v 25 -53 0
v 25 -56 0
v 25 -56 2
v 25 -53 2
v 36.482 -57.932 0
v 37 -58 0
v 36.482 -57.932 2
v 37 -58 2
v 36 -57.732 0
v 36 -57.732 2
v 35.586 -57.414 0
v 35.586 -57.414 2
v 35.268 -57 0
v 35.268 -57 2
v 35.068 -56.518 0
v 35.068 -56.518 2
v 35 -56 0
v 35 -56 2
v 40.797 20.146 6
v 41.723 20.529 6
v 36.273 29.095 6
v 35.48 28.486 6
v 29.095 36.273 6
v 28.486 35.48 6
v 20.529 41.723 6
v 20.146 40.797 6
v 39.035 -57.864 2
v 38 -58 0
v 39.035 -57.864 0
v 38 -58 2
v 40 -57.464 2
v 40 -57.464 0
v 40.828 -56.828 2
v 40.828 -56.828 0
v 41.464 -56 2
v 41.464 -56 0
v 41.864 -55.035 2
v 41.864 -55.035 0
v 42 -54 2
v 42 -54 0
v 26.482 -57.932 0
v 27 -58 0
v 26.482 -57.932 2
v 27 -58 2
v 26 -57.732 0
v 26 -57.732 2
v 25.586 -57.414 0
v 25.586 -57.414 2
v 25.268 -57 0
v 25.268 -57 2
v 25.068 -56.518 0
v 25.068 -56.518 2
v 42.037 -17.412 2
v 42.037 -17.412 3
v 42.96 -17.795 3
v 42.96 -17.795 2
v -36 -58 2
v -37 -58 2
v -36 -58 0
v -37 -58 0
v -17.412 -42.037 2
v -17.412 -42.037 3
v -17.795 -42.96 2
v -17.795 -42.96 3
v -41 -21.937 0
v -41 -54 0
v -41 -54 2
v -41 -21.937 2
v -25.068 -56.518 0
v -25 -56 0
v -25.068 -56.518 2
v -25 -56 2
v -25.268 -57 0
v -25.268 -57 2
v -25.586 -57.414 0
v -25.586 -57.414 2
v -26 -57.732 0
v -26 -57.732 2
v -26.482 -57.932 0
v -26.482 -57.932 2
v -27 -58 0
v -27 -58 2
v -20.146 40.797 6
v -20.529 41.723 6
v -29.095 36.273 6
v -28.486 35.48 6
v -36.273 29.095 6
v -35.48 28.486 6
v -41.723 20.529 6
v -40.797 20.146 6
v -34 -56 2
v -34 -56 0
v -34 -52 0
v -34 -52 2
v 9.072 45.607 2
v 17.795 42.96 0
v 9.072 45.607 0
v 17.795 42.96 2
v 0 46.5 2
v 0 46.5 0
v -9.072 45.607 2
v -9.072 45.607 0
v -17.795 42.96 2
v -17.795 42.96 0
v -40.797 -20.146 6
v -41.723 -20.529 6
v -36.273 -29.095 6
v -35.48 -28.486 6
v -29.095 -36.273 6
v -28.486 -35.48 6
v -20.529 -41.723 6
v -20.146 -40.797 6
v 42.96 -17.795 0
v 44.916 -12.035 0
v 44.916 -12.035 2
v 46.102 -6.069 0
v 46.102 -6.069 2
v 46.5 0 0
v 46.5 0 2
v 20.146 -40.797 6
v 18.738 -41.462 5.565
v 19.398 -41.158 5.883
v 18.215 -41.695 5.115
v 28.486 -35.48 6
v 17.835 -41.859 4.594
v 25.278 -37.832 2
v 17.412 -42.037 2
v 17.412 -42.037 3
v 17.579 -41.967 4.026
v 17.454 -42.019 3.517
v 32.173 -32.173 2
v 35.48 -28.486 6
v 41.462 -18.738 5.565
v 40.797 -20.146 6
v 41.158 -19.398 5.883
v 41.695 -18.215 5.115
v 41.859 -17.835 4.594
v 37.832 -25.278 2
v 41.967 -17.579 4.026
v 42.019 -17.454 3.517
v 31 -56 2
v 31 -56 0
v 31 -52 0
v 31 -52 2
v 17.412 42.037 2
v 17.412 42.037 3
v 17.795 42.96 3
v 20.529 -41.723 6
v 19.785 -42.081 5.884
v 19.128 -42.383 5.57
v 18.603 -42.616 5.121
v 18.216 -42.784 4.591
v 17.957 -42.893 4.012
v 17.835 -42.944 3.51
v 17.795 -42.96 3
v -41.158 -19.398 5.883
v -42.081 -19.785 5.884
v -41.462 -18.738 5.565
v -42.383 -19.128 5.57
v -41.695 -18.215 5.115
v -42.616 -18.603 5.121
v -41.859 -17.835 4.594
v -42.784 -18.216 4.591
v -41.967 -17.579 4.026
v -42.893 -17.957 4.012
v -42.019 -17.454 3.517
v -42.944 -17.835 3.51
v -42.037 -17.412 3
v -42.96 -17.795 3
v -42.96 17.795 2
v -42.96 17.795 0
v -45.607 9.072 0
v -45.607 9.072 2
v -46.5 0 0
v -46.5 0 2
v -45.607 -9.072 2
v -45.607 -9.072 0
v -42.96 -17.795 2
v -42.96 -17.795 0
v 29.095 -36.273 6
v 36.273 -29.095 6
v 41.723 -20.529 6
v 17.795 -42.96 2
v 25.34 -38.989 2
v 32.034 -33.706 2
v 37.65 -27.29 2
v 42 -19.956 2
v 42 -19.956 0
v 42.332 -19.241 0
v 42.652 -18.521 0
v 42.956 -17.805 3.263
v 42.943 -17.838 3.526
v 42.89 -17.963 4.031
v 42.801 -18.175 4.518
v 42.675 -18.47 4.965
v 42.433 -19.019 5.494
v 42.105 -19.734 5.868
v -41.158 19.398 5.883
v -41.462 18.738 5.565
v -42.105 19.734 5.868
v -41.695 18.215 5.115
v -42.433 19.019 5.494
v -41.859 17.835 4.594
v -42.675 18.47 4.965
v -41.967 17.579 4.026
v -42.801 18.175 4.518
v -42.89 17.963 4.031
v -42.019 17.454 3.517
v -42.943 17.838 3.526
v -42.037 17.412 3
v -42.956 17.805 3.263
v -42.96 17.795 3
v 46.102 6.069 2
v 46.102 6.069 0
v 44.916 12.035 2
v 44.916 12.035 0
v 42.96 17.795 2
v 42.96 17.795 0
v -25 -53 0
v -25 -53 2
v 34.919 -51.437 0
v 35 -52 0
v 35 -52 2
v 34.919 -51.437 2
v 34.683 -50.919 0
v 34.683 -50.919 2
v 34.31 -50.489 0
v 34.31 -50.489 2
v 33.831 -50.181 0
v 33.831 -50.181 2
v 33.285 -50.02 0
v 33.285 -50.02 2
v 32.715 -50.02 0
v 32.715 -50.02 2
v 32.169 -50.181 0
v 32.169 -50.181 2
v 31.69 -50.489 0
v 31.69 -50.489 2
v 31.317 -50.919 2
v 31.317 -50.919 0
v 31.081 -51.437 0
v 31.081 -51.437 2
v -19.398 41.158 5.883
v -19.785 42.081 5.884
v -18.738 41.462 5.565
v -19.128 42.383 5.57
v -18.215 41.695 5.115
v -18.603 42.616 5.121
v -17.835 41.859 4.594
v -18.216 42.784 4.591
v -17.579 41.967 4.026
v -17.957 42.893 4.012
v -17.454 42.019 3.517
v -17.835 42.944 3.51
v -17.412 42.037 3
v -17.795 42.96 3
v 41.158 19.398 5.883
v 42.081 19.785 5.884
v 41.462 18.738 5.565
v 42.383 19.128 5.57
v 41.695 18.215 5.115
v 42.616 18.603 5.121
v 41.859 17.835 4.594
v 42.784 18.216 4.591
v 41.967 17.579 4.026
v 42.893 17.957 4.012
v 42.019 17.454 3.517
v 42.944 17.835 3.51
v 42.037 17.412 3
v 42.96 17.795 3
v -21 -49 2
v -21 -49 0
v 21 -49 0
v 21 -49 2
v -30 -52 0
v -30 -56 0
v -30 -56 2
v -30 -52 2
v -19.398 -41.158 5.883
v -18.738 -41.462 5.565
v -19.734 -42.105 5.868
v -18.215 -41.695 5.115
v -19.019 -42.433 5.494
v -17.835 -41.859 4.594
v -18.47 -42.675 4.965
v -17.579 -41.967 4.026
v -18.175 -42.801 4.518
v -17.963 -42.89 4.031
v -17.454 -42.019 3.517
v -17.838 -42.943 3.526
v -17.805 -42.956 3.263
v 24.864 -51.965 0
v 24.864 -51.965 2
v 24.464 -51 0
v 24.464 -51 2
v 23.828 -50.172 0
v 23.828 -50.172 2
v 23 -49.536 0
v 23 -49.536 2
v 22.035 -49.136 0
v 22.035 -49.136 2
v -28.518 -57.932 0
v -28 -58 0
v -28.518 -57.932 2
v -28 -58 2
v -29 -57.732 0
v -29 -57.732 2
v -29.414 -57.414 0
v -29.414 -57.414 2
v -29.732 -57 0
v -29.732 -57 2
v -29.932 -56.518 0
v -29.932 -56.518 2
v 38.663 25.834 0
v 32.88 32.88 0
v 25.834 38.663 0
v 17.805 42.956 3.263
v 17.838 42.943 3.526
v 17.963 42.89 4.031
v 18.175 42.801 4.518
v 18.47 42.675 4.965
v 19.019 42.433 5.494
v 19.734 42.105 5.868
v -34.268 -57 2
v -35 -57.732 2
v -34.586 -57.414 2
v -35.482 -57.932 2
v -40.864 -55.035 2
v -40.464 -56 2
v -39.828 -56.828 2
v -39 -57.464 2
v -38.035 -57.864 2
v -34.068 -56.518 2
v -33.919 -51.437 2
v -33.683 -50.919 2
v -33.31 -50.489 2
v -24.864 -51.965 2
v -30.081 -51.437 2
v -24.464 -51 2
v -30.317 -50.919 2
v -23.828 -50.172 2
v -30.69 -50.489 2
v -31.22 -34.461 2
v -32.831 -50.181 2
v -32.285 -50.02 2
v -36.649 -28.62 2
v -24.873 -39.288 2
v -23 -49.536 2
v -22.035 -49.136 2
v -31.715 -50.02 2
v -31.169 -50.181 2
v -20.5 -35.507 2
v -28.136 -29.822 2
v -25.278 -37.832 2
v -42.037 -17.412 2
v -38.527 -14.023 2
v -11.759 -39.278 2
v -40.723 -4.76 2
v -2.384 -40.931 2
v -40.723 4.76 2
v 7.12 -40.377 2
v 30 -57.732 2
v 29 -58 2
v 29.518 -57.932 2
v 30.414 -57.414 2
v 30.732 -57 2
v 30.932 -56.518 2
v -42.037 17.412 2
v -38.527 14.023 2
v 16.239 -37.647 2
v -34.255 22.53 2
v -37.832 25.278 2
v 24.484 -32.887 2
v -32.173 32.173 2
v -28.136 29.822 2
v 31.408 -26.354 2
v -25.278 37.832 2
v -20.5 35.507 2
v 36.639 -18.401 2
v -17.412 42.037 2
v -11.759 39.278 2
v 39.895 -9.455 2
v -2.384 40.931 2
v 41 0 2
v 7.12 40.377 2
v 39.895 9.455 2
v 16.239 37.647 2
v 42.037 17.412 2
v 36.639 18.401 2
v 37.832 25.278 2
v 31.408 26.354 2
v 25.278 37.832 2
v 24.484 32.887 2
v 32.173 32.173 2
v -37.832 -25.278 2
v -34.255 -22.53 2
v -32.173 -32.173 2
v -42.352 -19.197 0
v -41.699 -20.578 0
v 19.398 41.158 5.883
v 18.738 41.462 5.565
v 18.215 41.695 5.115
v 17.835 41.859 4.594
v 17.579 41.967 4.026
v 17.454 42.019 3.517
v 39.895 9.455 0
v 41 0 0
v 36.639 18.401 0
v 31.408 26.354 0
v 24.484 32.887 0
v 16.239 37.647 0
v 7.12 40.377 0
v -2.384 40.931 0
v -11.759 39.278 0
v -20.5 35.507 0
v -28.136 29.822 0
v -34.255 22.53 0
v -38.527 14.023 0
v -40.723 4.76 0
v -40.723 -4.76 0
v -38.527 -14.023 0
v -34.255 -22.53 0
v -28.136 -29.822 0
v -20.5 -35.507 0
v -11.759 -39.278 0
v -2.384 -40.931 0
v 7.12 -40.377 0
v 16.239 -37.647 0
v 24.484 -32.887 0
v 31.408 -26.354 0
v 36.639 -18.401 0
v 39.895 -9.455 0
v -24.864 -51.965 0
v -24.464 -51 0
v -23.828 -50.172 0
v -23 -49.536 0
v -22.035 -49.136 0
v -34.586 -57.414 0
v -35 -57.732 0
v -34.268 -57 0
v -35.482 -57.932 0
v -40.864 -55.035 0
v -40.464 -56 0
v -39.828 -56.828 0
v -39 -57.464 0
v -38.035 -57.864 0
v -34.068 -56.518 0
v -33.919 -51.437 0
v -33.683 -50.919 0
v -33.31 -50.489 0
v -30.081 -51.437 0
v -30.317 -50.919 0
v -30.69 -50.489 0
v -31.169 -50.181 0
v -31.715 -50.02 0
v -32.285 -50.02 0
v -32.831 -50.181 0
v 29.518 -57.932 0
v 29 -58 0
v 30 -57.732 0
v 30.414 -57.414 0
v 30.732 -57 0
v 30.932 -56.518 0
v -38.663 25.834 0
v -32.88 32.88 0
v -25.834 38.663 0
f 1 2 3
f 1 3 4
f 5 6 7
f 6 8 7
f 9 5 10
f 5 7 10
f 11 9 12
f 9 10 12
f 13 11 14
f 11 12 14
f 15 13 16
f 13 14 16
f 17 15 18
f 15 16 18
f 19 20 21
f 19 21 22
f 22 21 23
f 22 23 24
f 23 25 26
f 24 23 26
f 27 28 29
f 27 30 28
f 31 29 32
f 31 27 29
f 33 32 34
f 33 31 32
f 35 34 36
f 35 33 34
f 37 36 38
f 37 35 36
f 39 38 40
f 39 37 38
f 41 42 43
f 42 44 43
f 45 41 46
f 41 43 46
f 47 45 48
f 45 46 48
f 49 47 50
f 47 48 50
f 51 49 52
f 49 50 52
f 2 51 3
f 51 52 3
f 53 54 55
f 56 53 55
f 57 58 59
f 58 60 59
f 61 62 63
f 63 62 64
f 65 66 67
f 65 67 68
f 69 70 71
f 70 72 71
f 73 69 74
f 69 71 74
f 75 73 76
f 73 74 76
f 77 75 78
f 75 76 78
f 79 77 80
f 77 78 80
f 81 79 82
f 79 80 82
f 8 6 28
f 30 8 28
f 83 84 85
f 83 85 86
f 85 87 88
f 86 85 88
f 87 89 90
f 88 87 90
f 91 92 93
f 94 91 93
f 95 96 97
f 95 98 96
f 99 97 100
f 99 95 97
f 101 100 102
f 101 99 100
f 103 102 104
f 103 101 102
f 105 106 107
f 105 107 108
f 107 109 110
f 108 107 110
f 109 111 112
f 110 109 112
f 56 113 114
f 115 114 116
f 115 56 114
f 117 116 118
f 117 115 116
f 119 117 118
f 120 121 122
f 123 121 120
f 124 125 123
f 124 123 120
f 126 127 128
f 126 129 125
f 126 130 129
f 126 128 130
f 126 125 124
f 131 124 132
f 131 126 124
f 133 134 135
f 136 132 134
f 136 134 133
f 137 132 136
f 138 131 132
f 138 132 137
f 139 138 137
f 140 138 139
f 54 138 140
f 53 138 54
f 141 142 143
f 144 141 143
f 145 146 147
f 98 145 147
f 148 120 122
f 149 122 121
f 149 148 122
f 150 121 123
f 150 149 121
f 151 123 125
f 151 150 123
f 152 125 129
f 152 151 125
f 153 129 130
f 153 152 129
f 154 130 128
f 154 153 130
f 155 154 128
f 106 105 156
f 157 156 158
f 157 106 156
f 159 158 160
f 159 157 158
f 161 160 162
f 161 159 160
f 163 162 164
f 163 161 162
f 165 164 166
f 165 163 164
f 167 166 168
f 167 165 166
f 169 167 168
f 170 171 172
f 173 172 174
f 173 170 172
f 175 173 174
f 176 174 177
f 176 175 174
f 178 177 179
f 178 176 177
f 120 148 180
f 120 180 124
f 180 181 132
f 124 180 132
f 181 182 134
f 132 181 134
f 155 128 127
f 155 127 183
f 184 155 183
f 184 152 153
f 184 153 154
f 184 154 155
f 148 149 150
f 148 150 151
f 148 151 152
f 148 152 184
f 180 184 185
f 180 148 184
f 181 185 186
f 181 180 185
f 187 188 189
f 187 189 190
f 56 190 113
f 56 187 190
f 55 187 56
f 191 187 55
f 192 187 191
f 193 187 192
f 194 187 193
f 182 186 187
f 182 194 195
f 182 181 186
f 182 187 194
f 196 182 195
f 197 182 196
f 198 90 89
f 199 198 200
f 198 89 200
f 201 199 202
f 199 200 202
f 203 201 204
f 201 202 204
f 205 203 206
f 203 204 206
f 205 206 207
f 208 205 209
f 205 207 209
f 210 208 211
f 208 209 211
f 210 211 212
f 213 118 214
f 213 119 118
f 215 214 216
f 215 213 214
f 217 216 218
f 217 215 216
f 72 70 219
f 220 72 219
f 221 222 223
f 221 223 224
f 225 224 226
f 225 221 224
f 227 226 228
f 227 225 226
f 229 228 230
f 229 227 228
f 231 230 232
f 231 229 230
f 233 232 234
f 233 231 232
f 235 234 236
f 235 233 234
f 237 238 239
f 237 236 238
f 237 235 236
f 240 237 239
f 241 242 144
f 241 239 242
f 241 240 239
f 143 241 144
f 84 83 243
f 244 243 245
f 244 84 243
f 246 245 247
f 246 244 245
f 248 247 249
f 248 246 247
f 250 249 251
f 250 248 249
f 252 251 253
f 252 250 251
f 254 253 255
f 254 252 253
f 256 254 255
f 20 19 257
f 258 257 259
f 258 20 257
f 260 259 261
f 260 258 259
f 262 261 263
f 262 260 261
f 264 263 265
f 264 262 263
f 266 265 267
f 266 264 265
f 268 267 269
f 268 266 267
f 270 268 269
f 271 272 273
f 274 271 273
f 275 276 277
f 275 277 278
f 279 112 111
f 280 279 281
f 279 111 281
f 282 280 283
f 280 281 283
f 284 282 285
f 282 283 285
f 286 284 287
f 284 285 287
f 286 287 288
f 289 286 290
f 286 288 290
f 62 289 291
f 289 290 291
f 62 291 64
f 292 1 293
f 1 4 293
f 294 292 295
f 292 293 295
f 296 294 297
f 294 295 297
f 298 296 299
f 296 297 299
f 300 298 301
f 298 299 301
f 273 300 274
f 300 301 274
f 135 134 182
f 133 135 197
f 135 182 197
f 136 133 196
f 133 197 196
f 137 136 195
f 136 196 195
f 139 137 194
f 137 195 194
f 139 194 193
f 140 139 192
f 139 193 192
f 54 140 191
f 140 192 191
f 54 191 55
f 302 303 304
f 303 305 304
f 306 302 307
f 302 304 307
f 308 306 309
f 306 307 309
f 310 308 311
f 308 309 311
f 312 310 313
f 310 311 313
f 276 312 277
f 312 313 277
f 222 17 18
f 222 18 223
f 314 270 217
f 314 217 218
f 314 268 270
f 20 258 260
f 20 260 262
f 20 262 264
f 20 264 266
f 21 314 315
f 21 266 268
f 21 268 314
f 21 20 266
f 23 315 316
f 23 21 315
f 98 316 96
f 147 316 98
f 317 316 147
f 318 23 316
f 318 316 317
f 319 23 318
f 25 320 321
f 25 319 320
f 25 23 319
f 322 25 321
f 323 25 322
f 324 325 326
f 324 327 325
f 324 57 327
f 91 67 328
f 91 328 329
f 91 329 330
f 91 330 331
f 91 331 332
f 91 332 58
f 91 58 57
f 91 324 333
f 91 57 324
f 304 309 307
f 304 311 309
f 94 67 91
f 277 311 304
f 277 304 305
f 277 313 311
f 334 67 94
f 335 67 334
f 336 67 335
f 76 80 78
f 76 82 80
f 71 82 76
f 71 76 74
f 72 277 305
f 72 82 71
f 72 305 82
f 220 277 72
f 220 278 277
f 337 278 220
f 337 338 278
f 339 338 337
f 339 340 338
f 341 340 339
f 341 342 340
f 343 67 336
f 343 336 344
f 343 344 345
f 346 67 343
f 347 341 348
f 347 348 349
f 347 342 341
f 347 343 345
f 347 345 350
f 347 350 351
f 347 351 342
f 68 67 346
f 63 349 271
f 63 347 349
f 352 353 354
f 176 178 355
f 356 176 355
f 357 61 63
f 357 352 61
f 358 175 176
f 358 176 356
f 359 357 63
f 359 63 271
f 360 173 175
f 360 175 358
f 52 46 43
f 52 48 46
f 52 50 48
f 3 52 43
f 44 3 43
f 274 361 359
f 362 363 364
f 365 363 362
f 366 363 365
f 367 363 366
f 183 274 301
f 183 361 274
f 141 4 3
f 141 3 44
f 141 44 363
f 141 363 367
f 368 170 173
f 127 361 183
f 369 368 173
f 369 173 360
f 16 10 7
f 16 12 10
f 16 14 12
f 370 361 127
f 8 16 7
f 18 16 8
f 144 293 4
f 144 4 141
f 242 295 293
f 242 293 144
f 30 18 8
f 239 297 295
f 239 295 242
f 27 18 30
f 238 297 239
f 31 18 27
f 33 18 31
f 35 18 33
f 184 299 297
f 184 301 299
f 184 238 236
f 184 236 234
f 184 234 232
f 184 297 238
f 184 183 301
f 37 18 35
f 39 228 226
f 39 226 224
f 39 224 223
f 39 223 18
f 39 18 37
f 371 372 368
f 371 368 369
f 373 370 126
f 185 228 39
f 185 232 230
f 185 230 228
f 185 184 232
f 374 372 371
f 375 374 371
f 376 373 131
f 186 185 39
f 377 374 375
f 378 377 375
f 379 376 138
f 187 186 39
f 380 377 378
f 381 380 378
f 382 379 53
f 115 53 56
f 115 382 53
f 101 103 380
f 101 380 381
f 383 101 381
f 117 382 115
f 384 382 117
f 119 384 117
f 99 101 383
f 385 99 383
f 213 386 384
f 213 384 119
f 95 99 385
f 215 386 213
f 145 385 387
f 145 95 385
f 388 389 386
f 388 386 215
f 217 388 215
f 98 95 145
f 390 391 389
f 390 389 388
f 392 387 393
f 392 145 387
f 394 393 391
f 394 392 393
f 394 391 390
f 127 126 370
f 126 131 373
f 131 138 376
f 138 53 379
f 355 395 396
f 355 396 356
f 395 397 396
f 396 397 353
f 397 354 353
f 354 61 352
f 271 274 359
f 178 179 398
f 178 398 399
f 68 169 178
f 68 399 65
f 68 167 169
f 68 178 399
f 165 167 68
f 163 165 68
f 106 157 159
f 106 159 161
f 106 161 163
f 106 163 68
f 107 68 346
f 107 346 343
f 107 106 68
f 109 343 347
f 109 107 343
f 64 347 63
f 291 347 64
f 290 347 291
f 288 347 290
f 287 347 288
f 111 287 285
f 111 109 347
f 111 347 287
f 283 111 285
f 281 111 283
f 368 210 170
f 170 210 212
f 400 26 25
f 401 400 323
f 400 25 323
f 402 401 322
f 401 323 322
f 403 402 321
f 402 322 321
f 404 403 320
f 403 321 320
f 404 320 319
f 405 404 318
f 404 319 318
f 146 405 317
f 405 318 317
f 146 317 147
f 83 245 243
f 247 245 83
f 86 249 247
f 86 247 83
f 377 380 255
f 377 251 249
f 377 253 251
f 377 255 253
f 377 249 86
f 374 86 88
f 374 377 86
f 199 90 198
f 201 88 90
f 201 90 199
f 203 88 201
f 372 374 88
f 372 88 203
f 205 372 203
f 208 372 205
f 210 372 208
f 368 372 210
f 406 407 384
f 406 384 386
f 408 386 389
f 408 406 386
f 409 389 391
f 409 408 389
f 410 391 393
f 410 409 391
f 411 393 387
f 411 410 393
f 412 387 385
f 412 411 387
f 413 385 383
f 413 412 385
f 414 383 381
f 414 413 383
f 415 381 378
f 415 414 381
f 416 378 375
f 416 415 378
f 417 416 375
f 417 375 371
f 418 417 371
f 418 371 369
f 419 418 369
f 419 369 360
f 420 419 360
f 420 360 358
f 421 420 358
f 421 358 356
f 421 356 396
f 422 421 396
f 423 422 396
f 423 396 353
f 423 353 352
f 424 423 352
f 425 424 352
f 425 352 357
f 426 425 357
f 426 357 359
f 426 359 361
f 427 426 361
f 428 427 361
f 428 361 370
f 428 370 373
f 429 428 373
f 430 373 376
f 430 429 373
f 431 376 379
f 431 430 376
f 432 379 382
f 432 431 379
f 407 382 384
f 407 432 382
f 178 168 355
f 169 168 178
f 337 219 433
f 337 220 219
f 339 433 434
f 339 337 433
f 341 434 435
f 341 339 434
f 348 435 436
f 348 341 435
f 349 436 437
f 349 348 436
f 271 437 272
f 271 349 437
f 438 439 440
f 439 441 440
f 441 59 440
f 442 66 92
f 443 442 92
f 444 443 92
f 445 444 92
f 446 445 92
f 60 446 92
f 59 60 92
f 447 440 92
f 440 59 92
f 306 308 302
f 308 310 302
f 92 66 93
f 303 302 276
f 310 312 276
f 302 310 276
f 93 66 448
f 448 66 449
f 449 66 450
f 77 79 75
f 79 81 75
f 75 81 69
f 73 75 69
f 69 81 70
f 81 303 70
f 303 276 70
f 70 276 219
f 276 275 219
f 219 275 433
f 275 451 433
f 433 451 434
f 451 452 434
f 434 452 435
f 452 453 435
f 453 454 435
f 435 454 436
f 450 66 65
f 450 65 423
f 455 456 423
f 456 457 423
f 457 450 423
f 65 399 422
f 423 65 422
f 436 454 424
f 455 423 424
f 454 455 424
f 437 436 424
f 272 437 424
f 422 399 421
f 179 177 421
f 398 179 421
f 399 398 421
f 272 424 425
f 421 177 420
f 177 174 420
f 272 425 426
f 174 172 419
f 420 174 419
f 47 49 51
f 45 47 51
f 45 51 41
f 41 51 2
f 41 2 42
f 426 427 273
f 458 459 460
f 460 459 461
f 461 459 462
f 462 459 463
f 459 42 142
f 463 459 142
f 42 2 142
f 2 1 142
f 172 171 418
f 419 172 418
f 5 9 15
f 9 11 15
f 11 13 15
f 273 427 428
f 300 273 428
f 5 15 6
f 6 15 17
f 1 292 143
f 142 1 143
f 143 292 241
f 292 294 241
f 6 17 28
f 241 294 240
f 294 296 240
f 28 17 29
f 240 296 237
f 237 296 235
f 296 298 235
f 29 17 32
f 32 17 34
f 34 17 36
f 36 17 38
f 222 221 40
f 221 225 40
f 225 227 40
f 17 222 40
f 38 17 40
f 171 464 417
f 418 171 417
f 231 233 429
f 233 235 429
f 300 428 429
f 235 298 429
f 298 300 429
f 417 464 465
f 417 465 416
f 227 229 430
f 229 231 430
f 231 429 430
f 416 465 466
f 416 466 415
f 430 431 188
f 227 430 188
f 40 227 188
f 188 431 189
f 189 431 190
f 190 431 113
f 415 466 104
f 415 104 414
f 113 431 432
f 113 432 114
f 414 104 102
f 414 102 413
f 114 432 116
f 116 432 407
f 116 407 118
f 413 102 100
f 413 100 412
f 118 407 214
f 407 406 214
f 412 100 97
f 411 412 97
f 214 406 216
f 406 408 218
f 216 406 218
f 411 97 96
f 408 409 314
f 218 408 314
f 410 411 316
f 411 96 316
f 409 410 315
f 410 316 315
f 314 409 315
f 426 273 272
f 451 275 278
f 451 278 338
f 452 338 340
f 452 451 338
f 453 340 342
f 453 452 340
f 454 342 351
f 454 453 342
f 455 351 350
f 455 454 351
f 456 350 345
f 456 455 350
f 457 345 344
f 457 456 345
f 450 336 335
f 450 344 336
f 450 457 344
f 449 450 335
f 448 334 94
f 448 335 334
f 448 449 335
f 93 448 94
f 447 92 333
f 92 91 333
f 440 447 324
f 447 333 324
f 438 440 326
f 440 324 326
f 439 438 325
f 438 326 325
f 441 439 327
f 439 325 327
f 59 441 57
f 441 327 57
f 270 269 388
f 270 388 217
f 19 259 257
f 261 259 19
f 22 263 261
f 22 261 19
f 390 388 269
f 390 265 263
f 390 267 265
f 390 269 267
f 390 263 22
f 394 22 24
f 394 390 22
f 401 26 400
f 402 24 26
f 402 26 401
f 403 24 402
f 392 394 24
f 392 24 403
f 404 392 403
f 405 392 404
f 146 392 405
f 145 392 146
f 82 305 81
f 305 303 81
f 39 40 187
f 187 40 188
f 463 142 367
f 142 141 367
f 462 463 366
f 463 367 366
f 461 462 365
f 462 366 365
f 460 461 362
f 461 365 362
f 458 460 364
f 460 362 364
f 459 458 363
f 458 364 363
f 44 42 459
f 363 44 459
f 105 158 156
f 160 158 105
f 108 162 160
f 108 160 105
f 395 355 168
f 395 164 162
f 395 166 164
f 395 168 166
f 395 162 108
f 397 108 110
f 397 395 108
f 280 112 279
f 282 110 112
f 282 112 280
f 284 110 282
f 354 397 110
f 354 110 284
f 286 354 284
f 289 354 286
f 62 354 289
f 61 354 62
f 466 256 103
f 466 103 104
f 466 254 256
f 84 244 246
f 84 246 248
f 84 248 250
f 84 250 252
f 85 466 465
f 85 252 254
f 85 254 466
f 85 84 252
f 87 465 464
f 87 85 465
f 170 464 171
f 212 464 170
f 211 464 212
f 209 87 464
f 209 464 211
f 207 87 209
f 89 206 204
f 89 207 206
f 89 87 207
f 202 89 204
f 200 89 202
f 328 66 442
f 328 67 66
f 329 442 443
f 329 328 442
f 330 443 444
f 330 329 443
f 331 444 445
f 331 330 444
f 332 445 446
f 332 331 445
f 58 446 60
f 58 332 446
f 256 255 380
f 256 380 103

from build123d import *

# Parameters (mm, degrees)
CYLINDER002_R            = 41
CYLINDER002_DEPTH        = 10
CYLINDER001_R            = 45.5
CYLINDER001_DEPTH        = 10
CYLINDER004_R            = 46.5
CYLINDER004_DEPTH        = 2
BOX002_W                 = 50
BOX002_H                 = 9
BOX002_DEPTH             = 2
FILLET_R                 = 4
CYLINDER003_R            = 2
CYLINDER003_DEPTH        = 10
ARRAY_X_COUNT            = 2
ARRAY_X_PITCH            = 65
ARRAY_Y_COUNT            = 2
ARRAY_Y_PITCH            = 10
BOX001_W                 = 4
BOX001_H                 = 10
BOX001_DEPTH             = 10
ARRAY001_X_COUNT         = 2
ARRAY001_X_PITCH         = 65
BOX_W                    = 83
BOX_H                    = 50
BOX_DEPTH                = 2
FILLET001_R              = 4
FILLET004_R              = 2
CYLINDER_W               = 46.5
CYLINDER_H               = 6
CYLINDER_ANGLE           = 45
FILLET003_R              = 3
ARRAY002_COUNT           = 4
ARRAY002_PLACEMENT_ANGLE = 22.5


with BuildPart() as hole_cylinder:
    # Cylinder002 → Cylinder002 (new body)
    with BuildSketch(Plane.XY):
        Circle(CYLINDER002_R)
    extrude(amount=CYLINDER002_DEPTH)


with BuildPart() as extract_fusion:
    # Cylinder001 → Cylinder001 (new body)
    with BuildSketch(Plane.XY.offset(2)):
        Circle(CYLINDER001_R)
    extrude(amount=CYLINDER001_DEPTH)

    # Fusion001: union hole cylinder
    add(hole_cylinder.part)


with BuildPart() as outer_cylinder:
    # Cylinder004 → Cylinder004 (new body)
    with BuildSketch(Plane.XY):
        Circle(CYLINDER004_R)
    extrude(amount=CYLINDER004_DEPTH)


with BuildPart() as fillet_body:
    # Box002 → Box002 (new body)
    with BuildSketch(Plane(origin=(-25, -58, 0), x_dir=(1, 0, 0), z_dir=(0, 0, 1))):
        with Locations((25, 4.5)):
            Rectangle(BOX002_W, BOX002_H)
    extrude(amount=BOX002_DEPTH)

    # Fillet
    fillet_edges = [fillet_body.edges().sort_by_distance(p)[0] for p in [
        (-25, -49, 1),
        (25, -49, 1),
    ]]
    fillet(fillet_edges, radius=FILLET_R)


with BuildPart() as hole_array:
    # Cylinder003 → Cylinder003 (new body)
    with BuildSketch(Plane.XY):
        Circle(CYLINDER003_R)
    extrude(amount=CYLINDER003_DEPTH)

    # Array X: hole array ×2


with BuildPart() as hole_array_1:
    add(hole_array.part)
    with Locations(*[(i * ARRAY_X_PITCH, 0, 0) for i in range(1, ARRAY_X_COUNT)]):
        add(hole_array.part)

    # Array Y: hole array ×2


with BuildPart() as hole_array_2:
    add(hole_array_1.part)
    with Locations(*[(0, i * ARRAY_Y_PITCH, 0) for i in range(1, ARRAY_Y_COUNT)]):
        add(hole_array_1.part)


with BuildPart() as fusion003:
    # Box001 → Box001 (new body)
    with BuildSketch(Plane(origin=(-2, 0, 0), x_dir=(1, 0, 0), z_dir=(0, 0, 1))):
        with Locations((2, 5)):
            Rectangle(BOX001_W, BOX001_H)
    extrude(amount=BOX001_DEPTH)

    # Array001 X: Fusion003 ×2


with BuildPart() as fusion003_1:
    add(fusion003.part)
    with Locations(*[(i * ARRAY001_X_PITCH, 0, 0) for i in range(1, ARRAY001_X_COUNT)]):
        add(fusion003.part)

    # Fusion002: union hole array
    add(hole_array_2.part)


with BuildPart() as fusion003_2:
    # Fusion002 placement: moved
    add(fusion003_1.part.moved(Location((-32, -62, 0))))

    # Fusion003: union Fillet body
    add(fillet_body.part)


with BuildPart() as fillet004:
    # Box → Box (new body)
    with BuildSketch(Plane(origin=(-41, -58, 0), x_dir=(1, 0, 0), z_dir=(0, 0, 1))):
        with Locations((41.5, 25)):
            Rectangle(BOX_W, BOX_H)
    extrude(amount=BOX_DEPTH)

    # Fillet001
    fillet001_edges = [fillet004.edges().sort_by_distance(p)[0] for p in [
        (-41, -58, 1),
        (42, -58, 1),
    ]]
    fillet(fillet001_edges, radius=FILLET001_R)

    # Cut001: cut Fusion003
    add(fusion003_2.part, mode=Mode.SUBTRACT)

    # Fillet004
    fillet004_edges = [fillet004.edges().sort_by_distance(p)[0] for p in [
        (35, -58, 1),
        (31, -58, 1),
        (25, -58, 1),
        (-25, -58, 1),
        (-30, -58, 1),
        (-34, -58, 1),
    ]]
    fillet(fillet004_edges, radius=FILLET004_R)


with BuildPart() as petri_dish_microsoft_holder:
    # Cylinder → Cylinder (revolve)
    with BuildSketch(Plane.XZ):
        with Locations((23.25, 3)):
            Rectangle(CYLINDER_W, CYLINDER_H)
    revolve(axis=Axis((0, 0, 0), (0, 0, 1)), revolution_arc=CYLINDER_ANGLE)

    # Fillet003
    fillet003_edges = [petri_dish_microsoft_holder.edges().sort_by_distance(p)[0] for p in [
        (23.25, 0, 6),
        (16.440233, 16.440233, 6),
    ]]
    fillet(fillet003_edges, radius=FILLET003_R)

    # Array002: petri dish microsoft holder ×4 about axis
    array002_axis = Axis((0, 0, 0), (0, 0, 1))


with BuildPart() as petri_dish_microsoft_holder_1:
    add(petri_dish_microsoft_holder.part)
    for i in range(1, ARRAY002_COUNT):
        add(petri_dish_microsoft_holder.part.rotate(array002_axis, i * 360 / ARRAY002_COUNT))


with BuildPart() as petri_dish_microsoft_holder_2:
    # Array002 placement: moved
    add(petri_dish_microsoft_holder_1.part.rotate(Axis((0, 0, 0), (0, 0, 1)), ARRAY002_PLACEMENT_ANGLE))

    # Fusion: union outer cylinder, Fillet004
    add(outer_cylinder.part)
    add(fillet004.part)

    # Cut: cut extract fusion
    add(extract_fusion.part, mode=Mode.SUBTRACT)


solid = petri_dish_microsoft_holder_2.part
